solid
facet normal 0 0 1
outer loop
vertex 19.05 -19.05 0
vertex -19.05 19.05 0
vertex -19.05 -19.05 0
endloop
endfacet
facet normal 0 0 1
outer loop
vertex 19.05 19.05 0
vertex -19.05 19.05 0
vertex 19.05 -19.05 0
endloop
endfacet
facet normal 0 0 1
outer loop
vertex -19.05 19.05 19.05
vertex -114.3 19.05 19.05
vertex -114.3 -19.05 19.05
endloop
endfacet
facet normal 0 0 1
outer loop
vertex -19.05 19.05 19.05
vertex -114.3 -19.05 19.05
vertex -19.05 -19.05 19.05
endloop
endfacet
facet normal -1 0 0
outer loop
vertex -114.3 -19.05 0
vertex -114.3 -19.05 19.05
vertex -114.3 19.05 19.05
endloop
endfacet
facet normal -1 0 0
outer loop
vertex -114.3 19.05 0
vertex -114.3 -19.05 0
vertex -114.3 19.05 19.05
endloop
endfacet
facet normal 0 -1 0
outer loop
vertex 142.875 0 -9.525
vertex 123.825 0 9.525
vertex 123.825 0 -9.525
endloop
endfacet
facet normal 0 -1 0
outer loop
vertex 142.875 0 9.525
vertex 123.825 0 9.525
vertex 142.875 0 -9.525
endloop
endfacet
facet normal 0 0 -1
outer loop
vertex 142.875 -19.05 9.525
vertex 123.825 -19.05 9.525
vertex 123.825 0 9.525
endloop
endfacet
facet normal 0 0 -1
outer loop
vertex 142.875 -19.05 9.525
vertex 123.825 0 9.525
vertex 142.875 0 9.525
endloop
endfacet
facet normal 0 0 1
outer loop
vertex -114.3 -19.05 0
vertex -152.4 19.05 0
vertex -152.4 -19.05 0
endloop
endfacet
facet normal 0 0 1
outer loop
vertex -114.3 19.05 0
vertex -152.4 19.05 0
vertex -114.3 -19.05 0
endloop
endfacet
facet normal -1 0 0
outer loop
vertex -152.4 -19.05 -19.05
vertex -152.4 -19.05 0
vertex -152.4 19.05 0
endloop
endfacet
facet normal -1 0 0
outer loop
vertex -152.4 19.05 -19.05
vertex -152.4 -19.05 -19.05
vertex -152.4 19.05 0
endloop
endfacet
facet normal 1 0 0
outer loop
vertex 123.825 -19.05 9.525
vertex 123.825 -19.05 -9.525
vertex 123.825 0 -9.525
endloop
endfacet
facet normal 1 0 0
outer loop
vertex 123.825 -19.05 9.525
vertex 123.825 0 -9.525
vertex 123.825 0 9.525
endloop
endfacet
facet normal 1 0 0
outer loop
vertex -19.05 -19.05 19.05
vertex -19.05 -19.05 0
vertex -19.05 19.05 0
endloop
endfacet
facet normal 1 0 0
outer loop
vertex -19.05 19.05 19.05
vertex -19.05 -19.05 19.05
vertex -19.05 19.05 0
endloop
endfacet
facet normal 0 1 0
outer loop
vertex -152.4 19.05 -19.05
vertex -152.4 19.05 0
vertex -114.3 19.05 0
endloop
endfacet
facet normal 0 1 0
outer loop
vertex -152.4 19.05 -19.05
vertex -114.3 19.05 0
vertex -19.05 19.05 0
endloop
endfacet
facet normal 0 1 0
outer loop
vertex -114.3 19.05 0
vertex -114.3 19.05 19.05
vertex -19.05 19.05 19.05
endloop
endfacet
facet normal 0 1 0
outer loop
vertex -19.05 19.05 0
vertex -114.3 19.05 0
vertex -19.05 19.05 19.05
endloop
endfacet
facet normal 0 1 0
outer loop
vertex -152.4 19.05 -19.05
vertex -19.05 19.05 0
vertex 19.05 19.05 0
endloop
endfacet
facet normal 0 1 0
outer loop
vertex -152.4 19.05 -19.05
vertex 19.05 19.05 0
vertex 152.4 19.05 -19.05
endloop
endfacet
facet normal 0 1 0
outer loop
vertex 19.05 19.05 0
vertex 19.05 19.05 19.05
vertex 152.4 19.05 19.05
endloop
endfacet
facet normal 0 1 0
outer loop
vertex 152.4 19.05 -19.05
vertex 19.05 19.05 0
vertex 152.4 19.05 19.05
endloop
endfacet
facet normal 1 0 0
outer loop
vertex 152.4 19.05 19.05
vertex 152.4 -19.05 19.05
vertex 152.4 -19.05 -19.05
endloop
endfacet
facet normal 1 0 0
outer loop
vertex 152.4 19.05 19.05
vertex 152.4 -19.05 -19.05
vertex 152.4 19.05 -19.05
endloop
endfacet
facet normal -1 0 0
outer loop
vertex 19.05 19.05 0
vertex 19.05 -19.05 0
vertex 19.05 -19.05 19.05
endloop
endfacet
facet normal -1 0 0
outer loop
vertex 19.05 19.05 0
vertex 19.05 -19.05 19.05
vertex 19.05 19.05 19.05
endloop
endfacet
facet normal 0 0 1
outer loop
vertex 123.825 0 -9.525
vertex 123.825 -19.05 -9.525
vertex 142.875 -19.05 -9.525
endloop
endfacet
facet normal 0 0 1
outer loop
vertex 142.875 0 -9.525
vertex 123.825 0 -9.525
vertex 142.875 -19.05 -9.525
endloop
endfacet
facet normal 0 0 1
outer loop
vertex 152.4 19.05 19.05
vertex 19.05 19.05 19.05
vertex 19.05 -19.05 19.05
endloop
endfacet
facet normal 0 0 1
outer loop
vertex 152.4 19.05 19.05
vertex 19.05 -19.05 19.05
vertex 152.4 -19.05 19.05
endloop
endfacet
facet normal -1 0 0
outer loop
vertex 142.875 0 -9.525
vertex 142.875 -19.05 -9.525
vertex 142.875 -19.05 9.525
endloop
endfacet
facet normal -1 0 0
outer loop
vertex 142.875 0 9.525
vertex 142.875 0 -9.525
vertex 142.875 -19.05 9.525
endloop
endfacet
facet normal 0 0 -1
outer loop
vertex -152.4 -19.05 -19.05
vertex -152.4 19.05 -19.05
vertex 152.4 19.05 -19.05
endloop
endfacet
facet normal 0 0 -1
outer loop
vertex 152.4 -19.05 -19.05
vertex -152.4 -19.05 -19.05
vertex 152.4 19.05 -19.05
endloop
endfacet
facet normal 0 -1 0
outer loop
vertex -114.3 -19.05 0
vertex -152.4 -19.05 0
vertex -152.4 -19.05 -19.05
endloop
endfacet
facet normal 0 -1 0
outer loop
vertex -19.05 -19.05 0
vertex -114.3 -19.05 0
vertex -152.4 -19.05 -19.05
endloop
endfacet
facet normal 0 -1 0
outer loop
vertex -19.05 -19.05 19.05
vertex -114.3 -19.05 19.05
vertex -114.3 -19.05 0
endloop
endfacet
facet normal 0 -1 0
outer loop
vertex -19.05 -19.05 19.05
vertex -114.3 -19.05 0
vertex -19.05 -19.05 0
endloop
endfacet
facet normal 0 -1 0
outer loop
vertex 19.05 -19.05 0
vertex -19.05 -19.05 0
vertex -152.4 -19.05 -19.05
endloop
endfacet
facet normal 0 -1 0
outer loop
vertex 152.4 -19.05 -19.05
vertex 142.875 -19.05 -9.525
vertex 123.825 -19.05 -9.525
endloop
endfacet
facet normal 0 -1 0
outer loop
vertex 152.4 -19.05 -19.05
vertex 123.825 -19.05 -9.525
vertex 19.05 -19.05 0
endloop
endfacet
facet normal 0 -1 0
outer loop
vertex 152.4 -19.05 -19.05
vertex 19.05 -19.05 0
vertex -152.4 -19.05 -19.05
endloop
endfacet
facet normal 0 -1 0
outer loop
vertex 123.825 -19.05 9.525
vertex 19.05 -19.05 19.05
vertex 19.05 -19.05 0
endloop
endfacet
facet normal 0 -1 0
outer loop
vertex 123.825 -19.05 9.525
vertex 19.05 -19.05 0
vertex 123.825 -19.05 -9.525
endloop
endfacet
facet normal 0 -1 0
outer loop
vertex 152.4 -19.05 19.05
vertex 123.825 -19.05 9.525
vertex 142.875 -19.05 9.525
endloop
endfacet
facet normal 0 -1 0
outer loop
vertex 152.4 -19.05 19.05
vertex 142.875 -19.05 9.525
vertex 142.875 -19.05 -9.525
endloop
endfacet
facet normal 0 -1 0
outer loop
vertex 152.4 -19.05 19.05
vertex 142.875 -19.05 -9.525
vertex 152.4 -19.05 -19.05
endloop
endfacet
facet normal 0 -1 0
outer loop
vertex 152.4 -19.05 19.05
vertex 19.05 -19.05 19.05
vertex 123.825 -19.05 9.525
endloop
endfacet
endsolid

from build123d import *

# Parameters (mm, degrees)
F0_W     = 304.8
F0_H     = 38.1
F1_DEPTH = 19.05
F2_W     = 38.1
F2_H     = 38.1
F3_DEPTH = 19.05
F4_W     = 19.05
F4_H     = 19.05
F5_DEPTH = 19.05
F6_W     = 38.1
F6_H     = 38.1
F7_DEPTH = 19.05


with BuildPart() as f1:
    # F0 (on Top) → F1 (new body, symmetric)
    with BuildSketch(Plane.XY):
        Rectangle(F0_W, F0_H)
    extrude(amount=F1_DEPTH, both=True)

    # F2 (on Top) → F3 (cut)
    with BuildSketch(Plane.XY):
        Rectangle(F2_W, F2_H)
    extrude(amount=F3_DEPTH, mode=Mode.SUBTRACT)

    # F4 (on face) → F5 (cut)
    with BuildSketch(Plane.XZ.offset(19.05)):
        with Locations((133.35, 0)):
            Rectangle(F4_W, F4_H)
    extrude(amount=-F5_DEPTH, mode=Mode.SUBTRACT)

    # F6 (on face) → F7 (cut)
    with BuildSketch(Plane.XY.offset(19.05)):
        with Locations((-133.35, 0)):
            Rectangle(F6_W, F6_H)
    extrude(amount=-F7_DEPTH, mode=Mode.SUBTRACT)


solid = f1.part
